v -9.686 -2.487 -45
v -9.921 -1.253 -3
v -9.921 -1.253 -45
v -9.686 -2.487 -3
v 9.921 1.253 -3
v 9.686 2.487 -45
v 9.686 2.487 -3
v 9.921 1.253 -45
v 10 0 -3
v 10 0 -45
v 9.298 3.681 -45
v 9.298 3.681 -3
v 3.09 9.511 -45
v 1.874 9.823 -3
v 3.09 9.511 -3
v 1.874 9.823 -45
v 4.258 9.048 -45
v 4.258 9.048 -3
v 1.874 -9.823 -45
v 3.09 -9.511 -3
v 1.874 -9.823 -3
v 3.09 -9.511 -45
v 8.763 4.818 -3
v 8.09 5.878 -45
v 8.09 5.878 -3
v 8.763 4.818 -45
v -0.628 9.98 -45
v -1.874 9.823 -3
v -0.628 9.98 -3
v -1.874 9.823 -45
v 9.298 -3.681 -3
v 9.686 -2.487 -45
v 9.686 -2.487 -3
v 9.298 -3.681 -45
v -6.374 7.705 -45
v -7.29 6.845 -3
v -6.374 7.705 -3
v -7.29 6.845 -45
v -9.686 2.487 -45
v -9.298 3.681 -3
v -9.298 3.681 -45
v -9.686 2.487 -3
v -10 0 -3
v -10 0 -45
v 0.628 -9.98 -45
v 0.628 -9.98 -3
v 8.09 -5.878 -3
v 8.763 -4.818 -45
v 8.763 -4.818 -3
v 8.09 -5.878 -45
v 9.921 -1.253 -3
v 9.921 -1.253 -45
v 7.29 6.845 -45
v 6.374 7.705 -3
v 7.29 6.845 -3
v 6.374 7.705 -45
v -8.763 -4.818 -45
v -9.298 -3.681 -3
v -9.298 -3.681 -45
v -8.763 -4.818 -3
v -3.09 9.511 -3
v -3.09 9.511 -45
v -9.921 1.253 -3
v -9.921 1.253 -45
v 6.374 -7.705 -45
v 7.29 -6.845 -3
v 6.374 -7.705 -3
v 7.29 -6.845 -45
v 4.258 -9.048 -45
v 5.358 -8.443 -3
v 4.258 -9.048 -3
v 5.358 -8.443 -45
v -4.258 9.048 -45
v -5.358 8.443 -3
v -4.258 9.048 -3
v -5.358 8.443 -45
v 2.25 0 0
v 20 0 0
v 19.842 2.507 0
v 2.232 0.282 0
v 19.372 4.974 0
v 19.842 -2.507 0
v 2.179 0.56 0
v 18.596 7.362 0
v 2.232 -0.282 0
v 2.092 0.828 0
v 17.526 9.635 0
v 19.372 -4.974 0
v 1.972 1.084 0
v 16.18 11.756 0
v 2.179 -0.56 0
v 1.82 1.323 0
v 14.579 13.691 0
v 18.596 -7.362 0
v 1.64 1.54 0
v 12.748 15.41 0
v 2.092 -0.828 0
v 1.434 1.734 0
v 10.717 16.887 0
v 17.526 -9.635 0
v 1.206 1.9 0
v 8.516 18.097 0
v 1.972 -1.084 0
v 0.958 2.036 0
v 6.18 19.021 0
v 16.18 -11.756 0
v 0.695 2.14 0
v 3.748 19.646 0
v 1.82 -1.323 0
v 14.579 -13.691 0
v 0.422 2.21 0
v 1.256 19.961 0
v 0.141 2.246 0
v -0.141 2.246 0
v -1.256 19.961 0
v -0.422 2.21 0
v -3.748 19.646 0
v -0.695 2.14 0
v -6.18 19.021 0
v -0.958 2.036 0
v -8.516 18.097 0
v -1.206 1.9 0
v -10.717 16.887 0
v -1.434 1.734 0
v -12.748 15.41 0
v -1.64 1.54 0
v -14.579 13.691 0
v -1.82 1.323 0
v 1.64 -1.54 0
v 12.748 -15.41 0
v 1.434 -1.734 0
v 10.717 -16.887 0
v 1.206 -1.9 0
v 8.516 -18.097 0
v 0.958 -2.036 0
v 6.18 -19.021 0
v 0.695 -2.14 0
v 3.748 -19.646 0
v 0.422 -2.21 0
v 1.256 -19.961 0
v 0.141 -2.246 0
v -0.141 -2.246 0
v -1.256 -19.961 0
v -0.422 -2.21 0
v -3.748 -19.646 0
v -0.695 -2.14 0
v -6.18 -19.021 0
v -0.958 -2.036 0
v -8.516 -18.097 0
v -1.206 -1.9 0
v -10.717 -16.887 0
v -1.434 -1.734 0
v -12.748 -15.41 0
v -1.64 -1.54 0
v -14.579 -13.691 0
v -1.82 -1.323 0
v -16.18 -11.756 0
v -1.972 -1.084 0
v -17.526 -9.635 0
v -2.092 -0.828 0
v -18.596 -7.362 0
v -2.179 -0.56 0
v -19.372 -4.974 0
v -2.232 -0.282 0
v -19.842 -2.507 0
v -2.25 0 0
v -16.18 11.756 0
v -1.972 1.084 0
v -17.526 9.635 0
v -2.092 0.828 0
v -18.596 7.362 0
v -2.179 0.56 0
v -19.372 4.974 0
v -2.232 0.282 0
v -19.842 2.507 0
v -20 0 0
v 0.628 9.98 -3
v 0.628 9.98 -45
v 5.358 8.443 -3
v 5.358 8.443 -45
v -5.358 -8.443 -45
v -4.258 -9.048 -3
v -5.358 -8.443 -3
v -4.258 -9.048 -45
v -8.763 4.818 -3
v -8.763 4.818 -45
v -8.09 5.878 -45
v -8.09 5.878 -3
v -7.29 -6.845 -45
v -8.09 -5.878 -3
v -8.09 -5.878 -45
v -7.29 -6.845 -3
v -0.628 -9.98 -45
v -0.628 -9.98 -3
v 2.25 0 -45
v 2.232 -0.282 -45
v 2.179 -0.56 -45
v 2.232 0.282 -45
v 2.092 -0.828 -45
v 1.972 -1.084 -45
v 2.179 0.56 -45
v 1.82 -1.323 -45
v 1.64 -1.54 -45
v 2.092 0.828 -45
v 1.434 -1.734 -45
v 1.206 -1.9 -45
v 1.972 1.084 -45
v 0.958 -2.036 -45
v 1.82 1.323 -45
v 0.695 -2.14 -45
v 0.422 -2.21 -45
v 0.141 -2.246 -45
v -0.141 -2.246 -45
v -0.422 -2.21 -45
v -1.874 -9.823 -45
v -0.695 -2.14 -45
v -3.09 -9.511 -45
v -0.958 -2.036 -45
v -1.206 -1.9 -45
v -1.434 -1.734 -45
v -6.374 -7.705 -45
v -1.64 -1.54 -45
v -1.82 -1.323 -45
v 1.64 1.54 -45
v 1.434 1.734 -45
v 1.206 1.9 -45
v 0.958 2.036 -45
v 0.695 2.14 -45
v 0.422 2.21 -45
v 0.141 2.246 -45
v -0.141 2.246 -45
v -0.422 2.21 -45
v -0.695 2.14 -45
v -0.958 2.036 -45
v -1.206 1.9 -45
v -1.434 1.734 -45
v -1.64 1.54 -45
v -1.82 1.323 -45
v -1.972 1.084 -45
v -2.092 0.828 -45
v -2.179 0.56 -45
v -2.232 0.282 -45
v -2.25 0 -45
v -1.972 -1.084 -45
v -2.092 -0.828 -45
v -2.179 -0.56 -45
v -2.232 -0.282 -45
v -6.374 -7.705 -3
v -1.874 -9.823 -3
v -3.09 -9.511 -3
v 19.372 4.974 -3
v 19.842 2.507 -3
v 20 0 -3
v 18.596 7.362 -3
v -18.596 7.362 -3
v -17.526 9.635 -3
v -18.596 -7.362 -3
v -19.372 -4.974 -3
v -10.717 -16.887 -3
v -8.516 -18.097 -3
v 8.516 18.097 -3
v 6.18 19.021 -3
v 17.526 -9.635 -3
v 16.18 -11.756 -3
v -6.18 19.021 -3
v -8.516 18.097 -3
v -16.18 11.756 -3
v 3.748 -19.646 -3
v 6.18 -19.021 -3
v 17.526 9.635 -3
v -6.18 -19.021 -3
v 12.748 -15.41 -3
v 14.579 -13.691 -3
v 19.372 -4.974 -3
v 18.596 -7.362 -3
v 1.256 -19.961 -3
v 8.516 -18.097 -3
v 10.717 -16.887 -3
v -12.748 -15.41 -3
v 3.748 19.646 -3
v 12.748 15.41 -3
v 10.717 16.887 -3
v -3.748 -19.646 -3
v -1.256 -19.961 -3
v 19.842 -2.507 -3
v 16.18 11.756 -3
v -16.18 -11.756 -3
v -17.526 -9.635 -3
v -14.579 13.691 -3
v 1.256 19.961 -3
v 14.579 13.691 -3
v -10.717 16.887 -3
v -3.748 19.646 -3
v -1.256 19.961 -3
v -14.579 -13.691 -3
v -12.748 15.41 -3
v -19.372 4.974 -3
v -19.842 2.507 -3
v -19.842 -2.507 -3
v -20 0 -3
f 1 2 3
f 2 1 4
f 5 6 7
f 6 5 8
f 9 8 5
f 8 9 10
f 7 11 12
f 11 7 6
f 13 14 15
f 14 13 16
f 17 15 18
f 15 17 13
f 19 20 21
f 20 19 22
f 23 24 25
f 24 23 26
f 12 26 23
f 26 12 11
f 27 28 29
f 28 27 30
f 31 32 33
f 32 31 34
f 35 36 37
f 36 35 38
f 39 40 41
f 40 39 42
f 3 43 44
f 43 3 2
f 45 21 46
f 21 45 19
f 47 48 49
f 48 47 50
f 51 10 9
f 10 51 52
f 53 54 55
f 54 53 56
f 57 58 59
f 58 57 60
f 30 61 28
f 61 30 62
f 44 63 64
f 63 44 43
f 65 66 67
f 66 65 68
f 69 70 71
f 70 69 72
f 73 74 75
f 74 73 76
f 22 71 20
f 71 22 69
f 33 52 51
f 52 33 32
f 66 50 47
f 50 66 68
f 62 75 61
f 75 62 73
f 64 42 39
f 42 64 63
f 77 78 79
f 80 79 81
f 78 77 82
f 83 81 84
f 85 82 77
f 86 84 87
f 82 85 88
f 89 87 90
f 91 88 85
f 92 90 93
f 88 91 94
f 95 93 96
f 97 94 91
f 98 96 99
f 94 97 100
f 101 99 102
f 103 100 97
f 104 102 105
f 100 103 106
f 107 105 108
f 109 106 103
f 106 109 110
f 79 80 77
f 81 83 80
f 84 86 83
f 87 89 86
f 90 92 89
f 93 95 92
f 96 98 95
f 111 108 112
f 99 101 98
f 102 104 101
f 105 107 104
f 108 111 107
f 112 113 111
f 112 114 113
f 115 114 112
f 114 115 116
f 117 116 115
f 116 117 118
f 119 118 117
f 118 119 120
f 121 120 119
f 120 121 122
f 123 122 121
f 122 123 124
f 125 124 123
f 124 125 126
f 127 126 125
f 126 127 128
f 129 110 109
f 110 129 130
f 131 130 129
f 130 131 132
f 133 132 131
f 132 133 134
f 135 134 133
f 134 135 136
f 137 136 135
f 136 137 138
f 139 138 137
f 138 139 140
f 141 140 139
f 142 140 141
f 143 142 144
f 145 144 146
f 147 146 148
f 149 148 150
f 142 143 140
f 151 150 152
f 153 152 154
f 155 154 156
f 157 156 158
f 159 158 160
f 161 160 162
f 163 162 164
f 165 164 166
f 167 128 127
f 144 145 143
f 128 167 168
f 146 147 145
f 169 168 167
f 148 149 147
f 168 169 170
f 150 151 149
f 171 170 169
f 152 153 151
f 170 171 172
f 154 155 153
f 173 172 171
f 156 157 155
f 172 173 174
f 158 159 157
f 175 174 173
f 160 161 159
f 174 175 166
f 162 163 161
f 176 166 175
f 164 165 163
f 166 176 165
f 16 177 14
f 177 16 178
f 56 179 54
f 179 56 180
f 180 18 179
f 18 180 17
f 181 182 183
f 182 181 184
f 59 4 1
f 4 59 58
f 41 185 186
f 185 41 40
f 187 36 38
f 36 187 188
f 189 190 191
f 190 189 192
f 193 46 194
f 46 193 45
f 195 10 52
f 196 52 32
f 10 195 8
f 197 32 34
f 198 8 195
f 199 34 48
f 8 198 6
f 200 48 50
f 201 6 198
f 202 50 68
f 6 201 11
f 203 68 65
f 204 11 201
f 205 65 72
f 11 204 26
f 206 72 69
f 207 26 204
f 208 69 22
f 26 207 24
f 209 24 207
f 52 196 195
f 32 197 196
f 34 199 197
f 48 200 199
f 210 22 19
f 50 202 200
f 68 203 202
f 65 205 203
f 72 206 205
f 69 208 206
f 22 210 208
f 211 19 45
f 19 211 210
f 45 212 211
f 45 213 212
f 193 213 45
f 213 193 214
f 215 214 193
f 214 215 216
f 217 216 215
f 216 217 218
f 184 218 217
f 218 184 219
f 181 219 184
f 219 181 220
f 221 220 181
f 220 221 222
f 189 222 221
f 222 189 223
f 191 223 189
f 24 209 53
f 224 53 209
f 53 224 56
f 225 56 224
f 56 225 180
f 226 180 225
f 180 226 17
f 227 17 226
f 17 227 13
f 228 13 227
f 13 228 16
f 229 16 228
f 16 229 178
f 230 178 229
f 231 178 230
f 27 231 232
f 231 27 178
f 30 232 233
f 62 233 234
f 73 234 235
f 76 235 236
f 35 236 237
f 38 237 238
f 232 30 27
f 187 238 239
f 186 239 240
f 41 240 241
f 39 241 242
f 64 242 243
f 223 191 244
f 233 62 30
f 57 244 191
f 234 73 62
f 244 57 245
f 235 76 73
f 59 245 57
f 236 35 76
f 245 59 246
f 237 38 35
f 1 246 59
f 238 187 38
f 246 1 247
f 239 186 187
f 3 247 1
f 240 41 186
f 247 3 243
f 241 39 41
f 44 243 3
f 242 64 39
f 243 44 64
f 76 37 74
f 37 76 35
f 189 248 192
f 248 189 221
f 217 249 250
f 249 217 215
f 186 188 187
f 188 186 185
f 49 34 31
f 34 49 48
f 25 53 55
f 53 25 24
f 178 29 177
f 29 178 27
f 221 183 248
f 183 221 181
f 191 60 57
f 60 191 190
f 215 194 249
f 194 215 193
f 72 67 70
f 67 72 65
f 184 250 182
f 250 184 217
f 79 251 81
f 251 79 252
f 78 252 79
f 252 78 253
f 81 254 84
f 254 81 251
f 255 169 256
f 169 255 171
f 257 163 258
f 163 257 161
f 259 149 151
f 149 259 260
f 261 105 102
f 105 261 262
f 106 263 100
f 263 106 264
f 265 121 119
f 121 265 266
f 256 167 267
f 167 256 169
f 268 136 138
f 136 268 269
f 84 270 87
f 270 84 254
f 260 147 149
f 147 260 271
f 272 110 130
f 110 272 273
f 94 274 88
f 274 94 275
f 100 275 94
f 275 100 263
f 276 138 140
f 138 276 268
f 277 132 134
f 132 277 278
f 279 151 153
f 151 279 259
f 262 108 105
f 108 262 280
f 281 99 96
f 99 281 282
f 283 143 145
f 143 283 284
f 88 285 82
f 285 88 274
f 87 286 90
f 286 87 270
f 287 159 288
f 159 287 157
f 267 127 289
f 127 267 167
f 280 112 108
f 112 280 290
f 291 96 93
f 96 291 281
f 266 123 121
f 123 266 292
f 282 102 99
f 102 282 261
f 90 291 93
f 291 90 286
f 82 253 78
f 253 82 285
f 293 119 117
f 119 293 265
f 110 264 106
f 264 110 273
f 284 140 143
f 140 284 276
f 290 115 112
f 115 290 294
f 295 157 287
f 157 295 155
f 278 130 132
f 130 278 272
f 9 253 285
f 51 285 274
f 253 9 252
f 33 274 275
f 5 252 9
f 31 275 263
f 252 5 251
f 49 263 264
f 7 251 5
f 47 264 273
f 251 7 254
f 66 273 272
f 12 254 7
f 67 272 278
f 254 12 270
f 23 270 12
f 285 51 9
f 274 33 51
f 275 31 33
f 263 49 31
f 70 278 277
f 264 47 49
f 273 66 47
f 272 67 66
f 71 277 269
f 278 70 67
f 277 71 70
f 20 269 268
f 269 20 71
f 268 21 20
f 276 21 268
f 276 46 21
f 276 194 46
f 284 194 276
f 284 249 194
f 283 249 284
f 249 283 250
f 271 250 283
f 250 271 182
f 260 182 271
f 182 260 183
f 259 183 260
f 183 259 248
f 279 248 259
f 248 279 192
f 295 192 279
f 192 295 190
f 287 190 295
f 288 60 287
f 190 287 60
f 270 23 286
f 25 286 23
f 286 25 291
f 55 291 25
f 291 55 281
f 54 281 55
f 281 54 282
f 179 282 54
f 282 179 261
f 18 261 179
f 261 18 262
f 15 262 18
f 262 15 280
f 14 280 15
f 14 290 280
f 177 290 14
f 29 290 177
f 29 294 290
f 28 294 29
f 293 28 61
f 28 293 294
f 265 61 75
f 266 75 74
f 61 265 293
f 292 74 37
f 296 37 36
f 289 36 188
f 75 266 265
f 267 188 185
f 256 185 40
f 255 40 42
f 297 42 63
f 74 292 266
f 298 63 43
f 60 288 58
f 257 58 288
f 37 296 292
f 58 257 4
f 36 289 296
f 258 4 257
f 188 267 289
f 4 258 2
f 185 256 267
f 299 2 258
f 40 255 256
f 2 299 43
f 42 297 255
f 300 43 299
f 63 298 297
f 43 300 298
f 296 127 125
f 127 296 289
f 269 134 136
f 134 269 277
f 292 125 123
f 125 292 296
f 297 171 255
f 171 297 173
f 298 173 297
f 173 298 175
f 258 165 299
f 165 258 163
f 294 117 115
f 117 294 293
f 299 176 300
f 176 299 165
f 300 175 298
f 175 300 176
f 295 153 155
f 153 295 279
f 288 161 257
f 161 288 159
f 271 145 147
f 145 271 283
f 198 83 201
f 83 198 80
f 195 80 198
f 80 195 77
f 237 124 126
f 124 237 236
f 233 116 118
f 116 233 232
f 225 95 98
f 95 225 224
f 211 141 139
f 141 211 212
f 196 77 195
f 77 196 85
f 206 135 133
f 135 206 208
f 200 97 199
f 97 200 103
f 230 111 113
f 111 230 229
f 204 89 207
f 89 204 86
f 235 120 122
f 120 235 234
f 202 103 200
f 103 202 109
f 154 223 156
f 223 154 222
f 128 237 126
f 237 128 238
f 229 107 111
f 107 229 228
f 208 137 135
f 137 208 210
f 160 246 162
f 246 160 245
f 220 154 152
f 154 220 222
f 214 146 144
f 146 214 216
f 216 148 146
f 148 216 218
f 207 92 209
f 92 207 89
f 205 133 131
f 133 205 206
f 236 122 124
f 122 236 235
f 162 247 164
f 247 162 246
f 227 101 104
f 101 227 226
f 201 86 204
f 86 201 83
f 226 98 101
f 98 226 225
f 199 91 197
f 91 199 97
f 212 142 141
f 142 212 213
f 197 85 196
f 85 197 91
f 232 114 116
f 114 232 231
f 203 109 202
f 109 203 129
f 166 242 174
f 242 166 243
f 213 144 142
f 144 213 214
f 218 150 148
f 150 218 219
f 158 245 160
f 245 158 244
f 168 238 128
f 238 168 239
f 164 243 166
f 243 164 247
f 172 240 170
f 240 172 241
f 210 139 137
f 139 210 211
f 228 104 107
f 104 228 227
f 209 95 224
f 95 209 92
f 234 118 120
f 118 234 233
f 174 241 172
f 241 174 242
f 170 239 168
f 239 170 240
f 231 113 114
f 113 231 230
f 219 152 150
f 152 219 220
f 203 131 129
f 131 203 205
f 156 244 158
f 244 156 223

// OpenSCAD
$fn = 50;


difference() {
	union() {
		translate(v = [0, 0, -45.0000000000]) {
			cylinder(h = 45, r = 10.0000000000);
		}
		translate(v = [0, 0, -3.0000000000]) {
			cylinder(h = 3, r = 20.0000000000);
		}
	}
	union() {
		#translate(v = [0, 0, -45]) {
			cylinder(h = 45, r = 2.2500000000);
		}
	}
}
